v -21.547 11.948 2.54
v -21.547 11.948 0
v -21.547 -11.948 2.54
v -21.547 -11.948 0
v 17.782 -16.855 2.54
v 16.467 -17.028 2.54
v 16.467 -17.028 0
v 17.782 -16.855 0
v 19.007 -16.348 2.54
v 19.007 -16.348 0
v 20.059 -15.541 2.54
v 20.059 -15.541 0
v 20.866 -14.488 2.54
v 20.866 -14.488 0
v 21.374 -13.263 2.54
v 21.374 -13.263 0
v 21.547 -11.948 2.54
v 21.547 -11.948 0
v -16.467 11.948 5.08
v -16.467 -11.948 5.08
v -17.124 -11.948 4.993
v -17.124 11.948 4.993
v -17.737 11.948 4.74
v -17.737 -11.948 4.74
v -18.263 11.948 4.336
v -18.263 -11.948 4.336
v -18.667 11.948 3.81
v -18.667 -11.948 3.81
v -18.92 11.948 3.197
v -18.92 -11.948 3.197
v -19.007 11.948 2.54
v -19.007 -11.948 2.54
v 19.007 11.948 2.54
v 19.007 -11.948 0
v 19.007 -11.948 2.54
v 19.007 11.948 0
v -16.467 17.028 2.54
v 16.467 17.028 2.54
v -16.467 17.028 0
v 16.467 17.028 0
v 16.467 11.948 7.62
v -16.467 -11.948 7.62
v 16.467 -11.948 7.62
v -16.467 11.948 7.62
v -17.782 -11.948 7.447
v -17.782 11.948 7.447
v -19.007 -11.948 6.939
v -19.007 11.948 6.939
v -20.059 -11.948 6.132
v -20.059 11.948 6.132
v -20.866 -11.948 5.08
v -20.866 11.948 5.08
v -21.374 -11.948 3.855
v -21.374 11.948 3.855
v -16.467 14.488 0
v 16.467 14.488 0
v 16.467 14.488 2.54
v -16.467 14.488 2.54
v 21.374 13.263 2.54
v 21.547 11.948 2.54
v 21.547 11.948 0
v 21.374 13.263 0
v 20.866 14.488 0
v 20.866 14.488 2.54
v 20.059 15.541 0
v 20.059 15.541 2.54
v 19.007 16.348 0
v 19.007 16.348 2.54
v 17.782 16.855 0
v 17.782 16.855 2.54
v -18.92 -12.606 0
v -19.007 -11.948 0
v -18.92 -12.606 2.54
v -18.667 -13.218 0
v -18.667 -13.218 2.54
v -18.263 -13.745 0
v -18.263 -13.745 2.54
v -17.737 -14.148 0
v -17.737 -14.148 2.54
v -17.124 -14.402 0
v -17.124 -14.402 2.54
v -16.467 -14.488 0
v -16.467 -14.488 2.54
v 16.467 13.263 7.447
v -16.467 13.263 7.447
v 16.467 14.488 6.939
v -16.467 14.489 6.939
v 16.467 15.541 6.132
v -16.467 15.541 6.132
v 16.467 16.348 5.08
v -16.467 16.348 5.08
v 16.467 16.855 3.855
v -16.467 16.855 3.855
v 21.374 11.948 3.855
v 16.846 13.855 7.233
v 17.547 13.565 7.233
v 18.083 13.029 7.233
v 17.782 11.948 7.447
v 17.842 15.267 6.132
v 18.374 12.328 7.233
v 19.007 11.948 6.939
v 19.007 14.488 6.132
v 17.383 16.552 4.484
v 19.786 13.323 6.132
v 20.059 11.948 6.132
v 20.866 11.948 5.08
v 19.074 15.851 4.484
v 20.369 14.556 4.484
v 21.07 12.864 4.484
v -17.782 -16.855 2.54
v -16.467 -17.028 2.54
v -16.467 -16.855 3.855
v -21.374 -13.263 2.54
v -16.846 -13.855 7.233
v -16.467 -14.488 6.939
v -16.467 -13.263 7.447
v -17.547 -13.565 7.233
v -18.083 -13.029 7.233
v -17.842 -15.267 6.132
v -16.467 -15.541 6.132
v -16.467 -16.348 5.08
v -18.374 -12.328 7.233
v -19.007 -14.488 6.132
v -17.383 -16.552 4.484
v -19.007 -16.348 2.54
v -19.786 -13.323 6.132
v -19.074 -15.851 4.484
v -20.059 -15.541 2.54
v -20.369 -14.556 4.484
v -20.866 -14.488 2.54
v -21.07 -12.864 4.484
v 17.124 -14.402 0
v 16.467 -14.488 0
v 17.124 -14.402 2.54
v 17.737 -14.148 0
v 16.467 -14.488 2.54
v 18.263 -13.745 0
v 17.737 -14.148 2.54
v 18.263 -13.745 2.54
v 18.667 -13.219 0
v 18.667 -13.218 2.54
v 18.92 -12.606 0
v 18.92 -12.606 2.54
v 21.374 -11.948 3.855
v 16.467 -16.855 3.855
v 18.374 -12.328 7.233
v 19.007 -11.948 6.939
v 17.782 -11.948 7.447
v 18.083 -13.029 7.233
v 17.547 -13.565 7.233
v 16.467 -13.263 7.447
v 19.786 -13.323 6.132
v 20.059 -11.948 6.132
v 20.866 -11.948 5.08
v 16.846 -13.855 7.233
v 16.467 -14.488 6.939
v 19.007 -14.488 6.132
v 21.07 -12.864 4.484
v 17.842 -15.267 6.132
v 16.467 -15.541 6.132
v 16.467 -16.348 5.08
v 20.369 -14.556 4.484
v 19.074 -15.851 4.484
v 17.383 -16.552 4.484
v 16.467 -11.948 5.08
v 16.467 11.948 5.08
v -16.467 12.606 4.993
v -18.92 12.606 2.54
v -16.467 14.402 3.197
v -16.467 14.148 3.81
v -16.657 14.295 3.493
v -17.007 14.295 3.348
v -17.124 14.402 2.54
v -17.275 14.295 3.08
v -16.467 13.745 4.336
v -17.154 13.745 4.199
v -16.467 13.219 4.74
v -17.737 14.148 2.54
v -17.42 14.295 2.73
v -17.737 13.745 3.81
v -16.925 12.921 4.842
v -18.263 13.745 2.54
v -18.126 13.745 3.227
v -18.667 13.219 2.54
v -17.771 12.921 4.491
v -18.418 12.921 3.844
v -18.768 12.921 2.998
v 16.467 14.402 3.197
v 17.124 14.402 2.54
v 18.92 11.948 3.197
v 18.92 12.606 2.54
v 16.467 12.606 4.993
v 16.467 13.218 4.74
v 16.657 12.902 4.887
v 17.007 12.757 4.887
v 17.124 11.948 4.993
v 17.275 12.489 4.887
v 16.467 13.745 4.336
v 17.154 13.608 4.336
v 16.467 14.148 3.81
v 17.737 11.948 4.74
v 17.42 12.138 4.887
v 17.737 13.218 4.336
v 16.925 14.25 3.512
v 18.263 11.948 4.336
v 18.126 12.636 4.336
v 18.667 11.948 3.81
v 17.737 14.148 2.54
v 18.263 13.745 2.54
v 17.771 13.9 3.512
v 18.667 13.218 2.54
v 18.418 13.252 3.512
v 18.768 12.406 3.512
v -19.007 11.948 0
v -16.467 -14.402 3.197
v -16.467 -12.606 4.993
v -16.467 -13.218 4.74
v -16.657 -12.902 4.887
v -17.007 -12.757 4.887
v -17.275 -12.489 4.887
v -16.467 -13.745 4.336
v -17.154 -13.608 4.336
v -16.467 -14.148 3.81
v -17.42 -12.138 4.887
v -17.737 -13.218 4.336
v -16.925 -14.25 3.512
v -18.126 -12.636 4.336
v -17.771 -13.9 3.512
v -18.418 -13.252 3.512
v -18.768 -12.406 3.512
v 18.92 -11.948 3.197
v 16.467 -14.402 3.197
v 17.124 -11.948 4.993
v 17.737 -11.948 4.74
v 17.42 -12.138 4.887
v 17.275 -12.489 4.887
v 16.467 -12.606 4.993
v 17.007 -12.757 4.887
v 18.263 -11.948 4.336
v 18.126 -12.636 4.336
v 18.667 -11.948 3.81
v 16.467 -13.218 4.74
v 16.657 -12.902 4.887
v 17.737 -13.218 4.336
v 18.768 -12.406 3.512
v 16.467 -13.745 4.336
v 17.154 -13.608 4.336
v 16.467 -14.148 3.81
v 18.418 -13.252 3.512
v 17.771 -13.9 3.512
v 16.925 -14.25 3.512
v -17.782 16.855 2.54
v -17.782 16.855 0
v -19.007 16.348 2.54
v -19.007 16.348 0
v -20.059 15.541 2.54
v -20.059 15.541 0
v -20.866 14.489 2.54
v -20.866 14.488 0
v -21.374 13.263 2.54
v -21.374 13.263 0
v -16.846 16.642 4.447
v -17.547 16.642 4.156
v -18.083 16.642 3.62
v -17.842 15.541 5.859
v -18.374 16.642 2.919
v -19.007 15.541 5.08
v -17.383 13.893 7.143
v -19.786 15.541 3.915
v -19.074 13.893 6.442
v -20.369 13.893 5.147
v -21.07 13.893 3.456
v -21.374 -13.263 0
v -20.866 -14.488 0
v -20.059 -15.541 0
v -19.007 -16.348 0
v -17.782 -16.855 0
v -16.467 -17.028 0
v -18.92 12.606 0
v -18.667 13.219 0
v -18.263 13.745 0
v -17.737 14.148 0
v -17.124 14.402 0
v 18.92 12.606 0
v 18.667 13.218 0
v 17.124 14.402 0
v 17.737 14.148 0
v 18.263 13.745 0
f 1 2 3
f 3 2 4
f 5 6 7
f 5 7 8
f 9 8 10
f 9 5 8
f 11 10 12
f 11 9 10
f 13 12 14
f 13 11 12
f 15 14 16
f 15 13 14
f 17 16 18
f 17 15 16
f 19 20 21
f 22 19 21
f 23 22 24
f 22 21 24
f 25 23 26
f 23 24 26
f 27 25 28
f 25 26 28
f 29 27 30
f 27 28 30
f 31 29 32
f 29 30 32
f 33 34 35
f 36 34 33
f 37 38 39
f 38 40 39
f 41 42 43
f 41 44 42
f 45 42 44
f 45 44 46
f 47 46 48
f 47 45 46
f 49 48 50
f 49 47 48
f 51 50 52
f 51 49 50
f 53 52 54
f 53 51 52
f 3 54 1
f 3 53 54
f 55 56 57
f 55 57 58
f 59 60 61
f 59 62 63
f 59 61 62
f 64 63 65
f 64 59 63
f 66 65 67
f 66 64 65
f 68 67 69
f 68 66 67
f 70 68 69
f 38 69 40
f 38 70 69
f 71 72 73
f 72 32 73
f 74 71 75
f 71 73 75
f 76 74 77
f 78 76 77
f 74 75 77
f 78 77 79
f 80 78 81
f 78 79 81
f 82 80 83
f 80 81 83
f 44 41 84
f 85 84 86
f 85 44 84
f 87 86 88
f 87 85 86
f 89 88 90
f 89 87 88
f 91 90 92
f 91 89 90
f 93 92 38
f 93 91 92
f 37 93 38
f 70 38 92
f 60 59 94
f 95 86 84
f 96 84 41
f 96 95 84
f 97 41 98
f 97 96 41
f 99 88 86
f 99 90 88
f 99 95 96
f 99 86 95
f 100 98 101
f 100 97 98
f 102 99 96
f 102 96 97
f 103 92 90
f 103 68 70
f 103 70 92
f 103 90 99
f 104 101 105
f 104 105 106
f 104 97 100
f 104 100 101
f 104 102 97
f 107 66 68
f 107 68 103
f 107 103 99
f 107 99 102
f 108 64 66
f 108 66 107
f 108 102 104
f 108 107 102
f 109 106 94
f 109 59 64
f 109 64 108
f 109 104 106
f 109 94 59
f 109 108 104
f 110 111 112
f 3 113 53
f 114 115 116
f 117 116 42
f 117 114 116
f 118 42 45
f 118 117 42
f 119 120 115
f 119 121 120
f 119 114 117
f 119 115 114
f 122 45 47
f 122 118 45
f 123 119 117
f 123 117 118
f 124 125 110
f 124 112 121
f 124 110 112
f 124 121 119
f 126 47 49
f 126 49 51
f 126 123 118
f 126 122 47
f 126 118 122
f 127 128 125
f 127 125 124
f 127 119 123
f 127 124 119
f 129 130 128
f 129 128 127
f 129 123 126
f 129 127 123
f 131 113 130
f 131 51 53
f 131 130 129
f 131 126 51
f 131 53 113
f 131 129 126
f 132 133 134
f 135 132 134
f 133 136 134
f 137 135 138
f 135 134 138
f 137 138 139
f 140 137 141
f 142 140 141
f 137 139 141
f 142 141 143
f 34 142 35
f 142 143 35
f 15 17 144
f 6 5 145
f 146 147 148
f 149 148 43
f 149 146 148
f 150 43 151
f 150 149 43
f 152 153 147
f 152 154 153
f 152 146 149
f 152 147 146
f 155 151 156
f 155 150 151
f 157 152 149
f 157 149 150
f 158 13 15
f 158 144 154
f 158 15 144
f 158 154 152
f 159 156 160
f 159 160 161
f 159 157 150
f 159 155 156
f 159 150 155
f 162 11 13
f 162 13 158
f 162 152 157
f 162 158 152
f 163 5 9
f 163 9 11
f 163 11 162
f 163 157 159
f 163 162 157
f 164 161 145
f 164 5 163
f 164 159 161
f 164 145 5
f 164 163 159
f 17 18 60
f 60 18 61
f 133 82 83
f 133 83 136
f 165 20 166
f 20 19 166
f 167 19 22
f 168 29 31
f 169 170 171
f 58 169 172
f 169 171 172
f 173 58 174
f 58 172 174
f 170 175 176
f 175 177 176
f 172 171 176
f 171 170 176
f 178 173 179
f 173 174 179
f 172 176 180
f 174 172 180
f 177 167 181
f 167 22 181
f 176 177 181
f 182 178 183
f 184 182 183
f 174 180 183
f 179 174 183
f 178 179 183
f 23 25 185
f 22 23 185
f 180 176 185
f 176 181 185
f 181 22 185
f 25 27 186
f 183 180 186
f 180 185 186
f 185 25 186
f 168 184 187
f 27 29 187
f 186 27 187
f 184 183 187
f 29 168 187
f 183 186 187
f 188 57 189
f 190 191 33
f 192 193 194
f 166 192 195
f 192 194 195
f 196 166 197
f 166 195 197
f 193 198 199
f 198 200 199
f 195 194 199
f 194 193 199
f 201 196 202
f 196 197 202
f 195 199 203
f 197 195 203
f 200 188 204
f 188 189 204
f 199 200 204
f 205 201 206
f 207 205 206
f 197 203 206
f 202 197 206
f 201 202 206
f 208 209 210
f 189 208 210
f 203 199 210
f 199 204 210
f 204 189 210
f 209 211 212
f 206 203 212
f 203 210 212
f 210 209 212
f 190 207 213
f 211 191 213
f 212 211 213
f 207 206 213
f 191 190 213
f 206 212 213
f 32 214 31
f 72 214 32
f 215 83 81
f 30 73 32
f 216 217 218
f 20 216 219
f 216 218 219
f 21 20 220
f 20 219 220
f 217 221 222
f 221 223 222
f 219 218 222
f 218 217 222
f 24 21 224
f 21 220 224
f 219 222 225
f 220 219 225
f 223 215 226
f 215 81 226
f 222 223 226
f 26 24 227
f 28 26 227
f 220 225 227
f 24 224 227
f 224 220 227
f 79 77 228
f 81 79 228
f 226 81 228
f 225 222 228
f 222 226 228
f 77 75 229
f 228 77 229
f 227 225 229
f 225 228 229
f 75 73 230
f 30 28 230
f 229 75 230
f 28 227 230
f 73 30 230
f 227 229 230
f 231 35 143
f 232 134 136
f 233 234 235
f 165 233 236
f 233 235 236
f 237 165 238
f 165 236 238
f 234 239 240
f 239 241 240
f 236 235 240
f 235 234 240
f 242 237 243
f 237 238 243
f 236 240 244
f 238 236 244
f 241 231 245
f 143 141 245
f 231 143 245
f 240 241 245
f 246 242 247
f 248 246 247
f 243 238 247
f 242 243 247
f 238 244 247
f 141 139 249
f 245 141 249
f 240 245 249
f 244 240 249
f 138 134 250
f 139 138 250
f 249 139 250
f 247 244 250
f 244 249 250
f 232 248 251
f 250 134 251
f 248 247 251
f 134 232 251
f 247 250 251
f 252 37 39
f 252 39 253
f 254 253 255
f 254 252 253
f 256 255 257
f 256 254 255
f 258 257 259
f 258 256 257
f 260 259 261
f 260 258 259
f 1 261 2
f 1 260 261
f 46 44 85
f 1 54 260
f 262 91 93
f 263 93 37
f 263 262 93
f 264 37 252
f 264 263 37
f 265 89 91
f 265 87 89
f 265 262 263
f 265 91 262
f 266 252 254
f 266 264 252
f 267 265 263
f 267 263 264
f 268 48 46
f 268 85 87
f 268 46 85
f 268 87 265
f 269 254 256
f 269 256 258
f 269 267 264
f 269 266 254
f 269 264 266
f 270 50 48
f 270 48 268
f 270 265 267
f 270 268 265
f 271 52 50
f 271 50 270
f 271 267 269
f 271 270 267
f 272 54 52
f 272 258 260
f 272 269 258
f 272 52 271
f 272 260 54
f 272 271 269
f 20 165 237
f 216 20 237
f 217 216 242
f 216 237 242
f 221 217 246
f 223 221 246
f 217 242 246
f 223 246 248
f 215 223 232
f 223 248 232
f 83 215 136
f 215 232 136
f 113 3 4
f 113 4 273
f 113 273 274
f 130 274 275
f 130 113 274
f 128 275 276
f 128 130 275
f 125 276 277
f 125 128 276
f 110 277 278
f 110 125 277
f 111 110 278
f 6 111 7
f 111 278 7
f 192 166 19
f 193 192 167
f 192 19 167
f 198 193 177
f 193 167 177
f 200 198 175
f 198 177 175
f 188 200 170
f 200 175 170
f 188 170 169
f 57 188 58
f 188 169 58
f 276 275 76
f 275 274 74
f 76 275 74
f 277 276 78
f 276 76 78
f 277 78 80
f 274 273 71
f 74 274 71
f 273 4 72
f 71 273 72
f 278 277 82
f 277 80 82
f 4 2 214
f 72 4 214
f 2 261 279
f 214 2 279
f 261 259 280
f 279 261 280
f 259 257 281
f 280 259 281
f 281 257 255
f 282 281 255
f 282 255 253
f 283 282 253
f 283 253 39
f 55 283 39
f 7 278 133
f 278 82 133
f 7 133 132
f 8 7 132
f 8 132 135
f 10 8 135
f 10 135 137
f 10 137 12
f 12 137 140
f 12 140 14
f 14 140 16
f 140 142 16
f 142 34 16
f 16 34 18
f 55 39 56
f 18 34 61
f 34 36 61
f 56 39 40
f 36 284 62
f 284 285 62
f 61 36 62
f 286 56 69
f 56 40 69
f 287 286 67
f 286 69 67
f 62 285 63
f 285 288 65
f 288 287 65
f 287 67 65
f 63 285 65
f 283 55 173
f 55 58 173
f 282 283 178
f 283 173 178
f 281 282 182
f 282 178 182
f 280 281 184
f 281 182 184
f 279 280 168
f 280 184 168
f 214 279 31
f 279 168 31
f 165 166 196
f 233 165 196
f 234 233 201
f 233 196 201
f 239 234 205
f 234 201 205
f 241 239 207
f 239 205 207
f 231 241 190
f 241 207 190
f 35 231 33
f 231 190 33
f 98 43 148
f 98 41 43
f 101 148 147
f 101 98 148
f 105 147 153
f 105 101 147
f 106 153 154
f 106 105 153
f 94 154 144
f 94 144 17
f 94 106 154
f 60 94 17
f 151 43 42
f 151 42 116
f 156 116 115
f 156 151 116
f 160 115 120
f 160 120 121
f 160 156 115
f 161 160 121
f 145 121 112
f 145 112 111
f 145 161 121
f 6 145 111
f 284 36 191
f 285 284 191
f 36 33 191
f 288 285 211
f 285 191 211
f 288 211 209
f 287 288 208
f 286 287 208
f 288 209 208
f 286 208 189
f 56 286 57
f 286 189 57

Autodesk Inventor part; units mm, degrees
ref_plane "YZ Plane" through (0, 0, 0) normal (1, 0, 0) x (0, 1, 0)
ref_plane "XZ Plane" through (0, 0, 0) normal (0, 1, 0) x (-1, 0, 0)
ref_plane "XY Plane" through (0, 0, 0) normal (0, 0, 1) x (1, 0, 0)
sketch "Sketch1" plane through (0, 0, 0) normal (0, 0, 1) x (1, 0, 0)
  line L0 (-21.5469, -17.0285) -> (21.5469, -17.0285)
  line L1 (21.5469, -17.0285) -> (21.5469, 17.0285)
  line L2 (21.5469, 17.0285) -> (-21.5469, 17.0285)
  line L3 (-21.5469, 17.0285) -> (-21.5469, -17.0285)
extrude "Extrusion1" add sketch "Sketch1" along normal blind 7.62
fillet "Fillet1" radius 5.08 8 edges at (-21.5469, -17.0285, 3.81) (-21.5469, 0, 7.62) (-21.5469, 17.0285, 3.81) (21.5469, 17.0285, 3.81) (21.5469, -17.0285, 3.81) (0, -17.0285, 7.62) (21.5469, 0, 7.62) (0, 17.0285, 7.62)
shell "Shell1" thickness 2.54 removed faces 1 at (5.489, -5.6762, 0)
properties part number "Adaptive Lid"
